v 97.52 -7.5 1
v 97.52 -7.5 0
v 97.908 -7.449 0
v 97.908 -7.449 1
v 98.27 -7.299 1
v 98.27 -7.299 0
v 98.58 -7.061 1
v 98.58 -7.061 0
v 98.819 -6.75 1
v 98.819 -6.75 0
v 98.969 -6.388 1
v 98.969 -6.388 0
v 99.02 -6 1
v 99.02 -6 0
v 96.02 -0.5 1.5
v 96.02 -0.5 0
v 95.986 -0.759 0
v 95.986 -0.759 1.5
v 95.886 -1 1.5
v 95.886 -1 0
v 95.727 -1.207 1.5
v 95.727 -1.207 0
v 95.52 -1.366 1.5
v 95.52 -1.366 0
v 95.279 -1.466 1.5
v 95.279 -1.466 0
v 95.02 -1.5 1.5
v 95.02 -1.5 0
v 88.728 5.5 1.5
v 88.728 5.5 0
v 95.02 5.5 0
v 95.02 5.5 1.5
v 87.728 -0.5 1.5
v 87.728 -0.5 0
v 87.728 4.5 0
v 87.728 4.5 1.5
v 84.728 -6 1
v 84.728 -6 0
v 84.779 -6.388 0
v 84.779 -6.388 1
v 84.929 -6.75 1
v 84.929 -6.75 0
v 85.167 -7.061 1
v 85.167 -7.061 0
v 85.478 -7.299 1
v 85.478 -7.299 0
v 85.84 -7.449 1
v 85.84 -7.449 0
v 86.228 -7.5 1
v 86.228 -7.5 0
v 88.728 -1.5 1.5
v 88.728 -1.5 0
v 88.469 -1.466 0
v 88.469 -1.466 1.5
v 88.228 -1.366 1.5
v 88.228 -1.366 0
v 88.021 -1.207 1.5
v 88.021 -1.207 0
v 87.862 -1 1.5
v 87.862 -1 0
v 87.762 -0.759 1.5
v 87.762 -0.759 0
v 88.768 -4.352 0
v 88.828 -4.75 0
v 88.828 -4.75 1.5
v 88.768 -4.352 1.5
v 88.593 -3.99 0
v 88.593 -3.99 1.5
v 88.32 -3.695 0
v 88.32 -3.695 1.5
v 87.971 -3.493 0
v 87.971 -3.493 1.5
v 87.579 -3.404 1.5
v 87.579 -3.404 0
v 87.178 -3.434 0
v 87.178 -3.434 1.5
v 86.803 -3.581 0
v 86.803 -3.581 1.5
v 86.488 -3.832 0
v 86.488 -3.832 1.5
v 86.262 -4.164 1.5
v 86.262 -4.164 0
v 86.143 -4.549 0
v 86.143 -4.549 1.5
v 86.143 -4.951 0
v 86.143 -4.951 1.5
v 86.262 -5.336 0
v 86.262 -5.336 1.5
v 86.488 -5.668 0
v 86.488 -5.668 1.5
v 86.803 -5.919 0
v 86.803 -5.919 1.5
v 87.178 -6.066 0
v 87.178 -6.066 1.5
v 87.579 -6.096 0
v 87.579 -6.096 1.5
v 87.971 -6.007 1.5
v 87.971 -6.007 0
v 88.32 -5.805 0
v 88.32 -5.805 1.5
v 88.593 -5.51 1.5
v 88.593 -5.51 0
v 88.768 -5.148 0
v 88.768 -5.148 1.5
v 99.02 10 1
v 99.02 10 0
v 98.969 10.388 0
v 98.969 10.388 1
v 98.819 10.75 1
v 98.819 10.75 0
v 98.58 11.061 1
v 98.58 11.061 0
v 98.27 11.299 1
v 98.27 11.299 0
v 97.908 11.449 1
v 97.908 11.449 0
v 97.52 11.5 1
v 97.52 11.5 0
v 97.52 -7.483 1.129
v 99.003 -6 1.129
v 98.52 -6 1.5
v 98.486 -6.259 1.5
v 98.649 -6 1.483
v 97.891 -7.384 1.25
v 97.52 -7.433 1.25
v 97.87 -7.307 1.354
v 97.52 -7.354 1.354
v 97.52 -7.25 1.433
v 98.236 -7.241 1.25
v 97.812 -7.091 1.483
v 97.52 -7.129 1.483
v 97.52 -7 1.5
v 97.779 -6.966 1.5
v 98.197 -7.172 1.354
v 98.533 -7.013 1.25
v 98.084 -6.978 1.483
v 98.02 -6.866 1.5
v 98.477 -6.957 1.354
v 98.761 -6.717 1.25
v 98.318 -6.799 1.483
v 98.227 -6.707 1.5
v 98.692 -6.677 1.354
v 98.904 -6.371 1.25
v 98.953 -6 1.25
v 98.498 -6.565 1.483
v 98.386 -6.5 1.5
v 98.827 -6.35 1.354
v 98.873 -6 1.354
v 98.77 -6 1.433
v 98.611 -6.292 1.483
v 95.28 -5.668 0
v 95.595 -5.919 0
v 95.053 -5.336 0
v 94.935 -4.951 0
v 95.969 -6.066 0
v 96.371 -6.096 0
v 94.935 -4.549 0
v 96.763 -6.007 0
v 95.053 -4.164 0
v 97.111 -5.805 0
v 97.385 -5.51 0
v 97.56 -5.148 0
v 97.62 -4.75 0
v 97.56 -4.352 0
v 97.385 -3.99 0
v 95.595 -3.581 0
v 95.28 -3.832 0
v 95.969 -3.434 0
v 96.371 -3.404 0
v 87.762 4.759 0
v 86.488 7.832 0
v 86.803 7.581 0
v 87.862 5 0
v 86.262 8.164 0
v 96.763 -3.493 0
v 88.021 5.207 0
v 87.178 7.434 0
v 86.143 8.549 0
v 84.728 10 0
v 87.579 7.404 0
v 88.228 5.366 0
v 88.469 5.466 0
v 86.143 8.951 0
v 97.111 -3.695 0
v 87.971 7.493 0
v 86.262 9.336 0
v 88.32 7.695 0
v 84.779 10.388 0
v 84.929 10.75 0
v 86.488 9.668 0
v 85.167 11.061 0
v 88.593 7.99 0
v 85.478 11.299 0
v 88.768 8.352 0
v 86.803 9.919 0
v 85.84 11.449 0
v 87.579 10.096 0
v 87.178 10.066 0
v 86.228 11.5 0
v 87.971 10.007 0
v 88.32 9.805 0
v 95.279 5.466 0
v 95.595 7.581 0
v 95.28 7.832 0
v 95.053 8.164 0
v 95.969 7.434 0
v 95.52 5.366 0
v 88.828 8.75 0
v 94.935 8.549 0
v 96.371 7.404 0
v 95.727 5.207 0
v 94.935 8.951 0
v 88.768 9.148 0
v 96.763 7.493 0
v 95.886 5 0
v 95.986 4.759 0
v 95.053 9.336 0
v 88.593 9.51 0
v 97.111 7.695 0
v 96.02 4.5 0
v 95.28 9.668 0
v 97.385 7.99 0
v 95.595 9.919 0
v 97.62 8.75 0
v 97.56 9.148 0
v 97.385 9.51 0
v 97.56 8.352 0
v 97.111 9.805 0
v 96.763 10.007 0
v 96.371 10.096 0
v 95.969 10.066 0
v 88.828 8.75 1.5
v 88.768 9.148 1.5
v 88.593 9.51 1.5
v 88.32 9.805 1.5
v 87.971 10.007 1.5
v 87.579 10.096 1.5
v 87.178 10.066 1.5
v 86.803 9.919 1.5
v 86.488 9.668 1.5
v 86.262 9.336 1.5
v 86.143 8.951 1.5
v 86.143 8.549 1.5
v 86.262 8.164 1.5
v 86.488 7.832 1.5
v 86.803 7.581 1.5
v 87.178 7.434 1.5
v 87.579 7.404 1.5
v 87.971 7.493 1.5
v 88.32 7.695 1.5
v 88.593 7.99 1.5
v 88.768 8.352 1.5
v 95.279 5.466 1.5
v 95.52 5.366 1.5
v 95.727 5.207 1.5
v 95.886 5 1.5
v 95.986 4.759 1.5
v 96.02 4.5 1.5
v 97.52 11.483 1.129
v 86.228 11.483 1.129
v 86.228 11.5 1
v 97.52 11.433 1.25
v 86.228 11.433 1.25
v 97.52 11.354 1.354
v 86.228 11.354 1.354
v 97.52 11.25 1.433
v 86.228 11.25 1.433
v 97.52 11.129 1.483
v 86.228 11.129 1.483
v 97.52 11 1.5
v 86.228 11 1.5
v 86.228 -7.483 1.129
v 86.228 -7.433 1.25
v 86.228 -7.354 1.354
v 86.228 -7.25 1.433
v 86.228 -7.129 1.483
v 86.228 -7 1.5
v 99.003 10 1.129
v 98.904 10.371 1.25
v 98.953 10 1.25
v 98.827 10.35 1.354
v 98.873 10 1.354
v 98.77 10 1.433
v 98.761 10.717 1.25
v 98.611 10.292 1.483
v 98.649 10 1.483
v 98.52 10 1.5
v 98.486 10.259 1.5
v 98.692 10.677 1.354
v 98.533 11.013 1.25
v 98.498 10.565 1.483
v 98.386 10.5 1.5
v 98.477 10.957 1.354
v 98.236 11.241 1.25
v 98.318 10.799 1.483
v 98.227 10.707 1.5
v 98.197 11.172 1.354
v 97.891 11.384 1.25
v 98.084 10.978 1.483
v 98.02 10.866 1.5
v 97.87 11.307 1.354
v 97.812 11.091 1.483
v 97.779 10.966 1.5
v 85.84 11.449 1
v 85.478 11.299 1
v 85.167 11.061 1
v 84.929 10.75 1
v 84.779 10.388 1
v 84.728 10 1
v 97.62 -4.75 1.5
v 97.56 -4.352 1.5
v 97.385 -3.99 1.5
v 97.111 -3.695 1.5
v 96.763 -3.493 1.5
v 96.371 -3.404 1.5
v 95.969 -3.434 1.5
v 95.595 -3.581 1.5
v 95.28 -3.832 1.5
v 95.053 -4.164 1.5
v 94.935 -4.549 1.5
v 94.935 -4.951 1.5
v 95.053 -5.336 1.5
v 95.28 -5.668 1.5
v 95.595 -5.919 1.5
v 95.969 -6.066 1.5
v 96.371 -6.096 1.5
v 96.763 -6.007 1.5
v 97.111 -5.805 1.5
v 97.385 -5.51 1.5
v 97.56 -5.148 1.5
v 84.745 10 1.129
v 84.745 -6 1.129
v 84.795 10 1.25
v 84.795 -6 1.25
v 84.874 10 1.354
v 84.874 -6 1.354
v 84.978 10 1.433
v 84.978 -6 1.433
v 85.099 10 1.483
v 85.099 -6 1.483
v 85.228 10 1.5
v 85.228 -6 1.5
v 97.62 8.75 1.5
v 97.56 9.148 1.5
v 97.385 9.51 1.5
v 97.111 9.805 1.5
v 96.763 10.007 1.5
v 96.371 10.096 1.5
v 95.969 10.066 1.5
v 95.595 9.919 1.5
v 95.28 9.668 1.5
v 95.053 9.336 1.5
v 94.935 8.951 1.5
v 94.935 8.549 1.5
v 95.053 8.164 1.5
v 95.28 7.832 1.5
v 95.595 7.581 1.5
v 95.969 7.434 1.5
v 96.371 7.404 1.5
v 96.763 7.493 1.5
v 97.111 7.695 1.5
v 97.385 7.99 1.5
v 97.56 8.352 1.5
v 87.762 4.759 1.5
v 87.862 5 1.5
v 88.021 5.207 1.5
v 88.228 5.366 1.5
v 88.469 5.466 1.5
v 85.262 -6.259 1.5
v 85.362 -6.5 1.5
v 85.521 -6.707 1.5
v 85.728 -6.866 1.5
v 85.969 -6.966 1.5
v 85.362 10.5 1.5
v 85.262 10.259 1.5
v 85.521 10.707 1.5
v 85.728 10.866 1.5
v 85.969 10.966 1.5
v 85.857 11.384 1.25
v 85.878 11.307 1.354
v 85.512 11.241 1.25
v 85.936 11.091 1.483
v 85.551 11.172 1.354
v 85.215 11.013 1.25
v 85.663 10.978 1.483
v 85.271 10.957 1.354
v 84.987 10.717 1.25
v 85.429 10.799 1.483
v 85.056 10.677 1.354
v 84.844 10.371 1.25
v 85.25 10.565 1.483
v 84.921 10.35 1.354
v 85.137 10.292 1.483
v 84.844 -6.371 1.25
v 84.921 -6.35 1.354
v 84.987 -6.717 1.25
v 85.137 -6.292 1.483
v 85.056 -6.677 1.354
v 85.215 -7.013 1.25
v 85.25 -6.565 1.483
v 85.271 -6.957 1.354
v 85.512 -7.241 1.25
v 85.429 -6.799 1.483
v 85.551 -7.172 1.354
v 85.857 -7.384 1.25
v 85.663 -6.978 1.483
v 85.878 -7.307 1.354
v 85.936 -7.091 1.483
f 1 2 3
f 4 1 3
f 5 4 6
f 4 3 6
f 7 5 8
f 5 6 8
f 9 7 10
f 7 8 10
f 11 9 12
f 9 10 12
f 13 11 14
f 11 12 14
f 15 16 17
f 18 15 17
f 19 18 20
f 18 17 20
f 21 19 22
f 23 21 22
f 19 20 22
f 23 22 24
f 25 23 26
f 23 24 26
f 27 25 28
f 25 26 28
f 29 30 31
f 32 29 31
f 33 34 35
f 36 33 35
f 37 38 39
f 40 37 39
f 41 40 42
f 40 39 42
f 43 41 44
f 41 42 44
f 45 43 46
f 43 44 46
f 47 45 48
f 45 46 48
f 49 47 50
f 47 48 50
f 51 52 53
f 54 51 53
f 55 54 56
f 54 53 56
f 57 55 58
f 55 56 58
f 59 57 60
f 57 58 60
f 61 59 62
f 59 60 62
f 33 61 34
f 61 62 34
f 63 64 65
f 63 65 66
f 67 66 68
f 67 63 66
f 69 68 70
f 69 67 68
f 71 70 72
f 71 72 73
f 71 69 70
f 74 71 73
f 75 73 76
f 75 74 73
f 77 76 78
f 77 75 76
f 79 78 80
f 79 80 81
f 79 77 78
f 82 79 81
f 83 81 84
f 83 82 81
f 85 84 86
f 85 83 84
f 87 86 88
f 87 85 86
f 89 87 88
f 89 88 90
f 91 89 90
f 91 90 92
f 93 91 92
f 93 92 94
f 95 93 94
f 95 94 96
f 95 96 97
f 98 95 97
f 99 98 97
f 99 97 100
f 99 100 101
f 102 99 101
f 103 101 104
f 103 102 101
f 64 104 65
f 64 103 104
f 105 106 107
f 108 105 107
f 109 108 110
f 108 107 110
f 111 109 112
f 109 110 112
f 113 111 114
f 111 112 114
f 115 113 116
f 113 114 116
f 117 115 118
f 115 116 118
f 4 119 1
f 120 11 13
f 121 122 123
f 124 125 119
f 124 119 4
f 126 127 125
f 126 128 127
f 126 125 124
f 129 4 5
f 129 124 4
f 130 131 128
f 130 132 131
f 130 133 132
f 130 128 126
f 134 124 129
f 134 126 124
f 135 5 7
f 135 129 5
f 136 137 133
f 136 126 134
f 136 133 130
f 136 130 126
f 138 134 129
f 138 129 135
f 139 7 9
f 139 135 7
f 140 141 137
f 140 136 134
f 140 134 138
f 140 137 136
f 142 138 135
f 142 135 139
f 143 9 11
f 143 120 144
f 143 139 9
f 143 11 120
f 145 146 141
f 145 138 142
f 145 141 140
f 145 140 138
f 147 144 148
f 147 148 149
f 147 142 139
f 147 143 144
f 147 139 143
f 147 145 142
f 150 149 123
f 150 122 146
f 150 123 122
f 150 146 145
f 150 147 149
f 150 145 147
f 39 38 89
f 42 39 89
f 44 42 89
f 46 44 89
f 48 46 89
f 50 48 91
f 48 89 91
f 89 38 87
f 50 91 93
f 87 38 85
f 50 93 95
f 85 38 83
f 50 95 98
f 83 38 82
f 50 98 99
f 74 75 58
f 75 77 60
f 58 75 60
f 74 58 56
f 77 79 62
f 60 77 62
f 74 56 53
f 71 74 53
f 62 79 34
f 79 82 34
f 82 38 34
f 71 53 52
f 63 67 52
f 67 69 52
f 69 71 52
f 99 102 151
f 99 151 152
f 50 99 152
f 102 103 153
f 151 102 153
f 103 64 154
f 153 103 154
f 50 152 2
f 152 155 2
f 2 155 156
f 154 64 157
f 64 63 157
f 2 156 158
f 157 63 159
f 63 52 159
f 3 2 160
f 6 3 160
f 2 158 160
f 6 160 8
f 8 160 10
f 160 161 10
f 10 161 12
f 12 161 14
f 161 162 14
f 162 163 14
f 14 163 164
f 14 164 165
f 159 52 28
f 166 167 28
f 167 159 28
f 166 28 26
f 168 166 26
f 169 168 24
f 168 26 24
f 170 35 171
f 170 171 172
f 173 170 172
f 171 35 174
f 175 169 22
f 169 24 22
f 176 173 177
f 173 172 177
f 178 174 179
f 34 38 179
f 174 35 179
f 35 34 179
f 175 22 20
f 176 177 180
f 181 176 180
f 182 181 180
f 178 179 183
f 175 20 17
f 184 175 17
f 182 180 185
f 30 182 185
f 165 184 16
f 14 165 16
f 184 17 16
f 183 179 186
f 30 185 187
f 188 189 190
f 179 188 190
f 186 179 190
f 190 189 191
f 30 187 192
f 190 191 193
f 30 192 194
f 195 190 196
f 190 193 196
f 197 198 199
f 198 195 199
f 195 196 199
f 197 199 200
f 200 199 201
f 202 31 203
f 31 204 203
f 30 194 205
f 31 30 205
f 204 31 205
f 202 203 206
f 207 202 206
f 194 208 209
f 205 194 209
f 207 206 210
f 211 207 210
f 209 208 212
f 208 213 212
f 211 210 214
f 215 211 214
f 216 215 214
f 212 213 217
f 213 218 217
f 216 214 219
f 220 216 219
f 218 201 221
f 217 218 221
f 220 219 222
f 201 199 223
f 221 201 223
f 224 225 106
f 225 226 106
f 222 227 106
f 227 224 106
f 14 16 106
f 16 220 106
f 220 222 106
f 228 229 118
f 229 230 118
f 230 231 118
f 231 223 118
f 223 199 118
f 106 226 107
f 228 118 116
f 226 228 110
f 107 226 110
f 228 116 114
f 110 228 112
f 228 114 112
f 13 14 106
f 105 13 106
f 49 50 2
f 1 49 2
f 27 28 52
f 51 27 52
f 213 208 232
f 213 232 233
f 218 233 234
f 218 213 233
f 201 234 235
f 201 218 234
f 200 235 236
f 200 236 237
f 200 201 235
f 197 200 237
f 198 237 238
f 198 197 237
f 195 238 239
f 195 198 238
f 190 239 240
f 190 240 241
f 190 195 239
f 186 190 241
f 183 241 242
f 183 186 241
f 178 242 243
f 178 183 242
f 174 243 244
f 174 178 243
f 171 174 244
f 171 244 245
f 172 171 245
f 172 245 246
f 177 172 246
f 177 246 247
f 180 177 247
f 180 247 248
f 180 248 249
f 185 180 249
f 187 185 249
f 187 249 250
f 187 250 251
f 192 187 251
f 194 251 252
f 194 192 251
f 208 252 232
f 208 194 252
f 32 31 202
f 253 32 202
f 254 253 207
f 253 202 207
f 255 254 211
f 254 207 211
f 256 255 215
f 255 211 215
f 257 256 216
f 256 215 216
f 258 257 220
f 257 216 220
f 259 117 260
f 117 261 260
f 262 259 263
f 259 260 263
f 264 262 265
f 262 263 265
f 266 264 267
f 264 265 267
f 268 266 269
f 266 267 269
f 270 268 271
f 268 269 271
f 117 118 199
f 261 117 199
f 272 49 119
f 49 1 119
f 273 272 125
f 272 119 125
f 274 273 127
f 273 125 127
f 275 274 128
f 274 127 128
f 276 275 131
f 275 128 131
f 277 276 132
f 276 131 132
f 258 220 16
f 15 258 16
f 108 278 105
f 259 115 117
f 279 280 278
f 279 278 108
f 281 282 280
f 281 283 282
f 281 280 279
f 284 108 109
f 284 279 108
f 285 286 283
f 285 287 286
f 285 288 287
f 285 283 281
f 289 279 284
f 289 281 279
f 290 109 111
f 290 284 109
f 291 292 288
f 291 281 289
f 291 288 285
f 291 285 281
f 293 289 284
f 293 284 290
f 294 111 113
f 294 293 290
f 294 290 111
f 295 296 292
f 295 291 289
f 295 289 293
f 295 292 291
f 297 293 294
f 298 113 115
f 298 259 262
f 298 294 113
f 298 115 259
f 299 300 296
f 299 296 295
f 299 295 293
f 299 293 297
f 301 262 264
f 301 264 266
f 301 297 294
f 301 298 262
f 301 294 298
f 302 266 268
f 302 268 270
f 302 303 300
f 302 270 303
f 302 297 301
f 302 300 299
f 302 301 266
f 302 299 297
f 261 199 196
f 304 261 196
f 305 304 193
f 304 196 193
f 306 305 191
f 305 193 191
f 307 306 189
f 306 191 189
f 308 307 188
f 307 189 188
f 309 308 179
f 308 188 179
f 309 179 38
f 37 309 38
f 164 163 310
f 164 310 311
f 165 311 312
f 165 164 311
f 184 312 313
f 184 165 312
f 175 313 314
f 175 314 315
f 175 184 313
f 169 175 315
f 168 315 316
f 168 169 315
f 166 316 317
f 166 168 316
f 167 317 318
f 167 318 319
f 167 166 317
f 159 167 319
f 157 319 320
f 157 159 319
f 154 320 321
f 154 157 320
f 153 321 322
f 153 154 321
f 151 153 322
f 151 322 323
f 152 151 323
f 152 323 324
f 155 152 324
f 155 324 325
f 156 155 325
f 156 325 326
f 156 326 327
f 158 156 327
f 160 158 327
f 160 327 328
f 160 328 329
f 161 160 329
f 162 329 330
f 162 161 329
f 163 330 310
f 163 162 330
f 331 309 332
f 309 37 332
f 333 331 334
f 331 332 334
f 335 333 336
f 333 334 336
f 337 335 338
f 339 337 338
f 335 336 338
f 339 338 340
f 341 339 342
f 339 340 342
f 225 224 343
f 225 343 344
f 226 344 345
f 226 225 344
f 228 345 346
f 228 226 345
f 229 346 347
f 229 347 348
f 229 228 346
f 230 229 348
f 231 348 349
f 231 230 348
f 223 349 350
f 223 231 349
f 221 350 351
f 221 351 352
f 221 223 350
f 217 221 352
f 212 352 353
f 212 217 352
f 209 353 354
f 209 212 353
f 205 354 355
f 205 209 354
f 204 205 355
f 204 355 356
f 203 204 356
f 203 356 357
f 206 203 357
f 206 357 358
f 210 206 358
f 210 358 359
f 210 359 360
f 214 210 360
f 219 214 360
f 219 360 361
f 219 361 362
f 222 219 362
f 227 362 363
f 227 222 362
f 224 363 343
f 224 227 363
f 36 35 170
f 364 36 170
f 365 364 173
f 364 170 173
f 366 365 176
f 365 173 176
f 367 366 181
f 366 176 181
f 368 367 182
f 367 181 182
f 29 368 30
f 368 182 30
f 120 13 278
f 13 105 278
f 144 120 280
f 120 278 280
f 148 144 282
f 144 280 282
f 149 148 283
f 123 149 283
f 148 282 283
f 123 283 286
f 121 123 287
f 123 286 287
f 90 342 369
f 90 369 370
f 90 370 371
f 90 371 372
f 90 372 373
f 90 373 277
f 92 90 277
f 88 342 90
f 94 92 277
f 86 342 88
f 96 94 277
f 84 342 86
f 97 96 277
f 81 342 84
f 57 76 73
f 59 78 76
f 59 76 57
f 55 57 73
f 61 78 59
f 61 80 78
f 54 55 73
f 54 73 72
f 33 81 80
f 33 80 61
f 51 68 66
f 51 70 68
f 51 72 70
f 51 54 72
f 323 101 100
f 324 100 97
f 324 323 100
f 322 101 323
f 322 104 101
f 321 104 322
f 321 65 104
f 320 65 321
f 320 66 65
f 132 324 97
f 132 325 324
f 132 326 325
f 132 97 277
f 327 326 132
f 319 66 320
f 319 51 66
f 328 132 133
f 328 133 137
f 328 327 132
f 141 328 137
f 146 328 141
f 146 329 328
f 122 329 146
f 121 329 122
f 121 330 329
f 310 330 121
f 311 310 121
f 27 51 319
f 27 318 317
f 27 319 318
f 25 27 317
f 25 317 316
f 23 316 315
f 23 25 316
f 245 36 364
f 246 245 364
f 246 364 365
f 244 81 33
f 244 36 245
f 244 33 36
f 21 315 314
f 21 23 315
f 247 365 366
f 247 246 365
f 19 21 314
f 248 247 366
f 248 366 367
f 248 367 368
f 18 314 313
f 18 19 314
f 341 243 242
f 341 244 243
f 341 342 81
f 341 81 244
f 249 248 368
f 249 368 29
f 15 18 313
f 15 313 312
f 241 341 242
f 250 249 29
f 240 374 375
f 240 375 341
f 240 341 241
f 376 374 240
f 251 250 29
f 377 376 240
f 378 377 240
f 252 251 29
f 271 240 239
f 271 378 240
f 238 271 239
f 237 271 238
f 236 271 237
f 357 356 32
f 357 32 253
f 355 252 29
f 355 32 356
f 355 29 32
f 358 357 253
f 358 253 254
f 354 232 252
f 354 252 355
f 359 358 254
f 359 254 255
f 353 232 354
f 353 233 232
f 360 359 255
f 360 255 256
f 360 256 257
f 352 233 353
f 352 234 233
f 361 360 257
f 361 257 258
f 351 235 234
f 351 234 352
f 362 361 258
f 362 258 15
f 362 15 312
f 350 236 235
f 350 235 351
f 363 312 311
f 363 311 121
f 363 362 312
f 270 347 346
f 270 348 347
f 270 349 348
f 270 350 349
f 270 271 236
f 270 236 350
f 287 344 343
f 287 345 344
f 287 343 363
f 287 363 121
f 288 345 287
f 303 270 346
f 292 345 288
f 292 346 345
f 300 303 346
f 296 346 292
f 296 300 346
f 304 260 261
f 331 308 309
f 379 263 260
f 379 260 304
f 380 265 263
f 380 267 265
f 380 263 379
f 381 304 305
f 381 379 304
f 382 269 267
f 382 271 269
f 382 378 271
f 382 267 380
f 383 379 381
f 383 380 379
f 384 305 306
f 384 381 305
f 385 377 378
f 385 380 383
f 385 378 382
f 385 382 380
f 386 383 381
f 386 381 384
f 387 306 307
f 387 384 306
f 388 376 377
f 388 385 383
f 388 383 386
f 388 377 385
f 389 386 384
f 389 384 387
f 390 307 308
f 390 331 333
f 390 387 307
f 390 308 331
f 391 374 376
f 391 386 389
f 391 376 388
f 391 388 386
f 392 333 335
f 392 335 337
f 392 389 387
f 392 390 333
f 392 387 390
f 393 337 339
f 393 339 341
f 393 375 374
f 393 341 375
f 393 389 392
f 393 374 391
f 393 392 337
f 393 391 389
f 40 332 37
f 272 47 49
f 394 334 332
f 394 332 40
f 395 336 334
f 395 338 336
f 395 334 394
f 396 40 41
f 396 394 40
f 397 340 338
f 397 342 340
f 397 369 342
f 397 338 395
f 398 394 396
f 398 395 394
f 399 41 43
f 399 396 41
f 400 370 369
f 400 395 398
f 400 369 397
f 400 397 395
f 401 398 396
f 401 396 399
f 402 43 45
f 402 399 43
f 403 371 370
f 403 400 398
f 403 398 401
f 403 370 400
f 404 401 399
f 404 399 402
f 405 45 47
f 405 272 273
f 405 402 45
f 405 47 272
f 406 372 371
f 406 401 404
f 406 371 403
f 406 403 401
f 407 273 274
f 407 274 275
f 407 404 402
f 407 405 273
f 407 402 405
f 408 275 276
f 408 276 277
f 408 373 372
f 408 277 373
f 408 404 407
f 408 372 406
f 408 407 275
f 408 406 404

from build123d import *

# Parameters (mm, degrees)
SKETCH_1_R      = 1.35
EXTRUDE_2_DEPTH = 1.5
FILLET_1_R      = 0.5


with BuildPart() as part:
    # 草图1 → 凸台-拉伸2 (new body)
    with BuildSketch(Plane.XY):
        with BuildLine():
            Line((97.519773553, 11.5), (86.228033822, 11.5))
            ThreePointArc((86.228033822, 11.5), (85.16737365, 11.060660172), (84.728033822, 10))
            Line((84.728033822, 10), (84.728033822, 7))
            Line((84.728033822, 7), (84.728033822, -3))
            Line((84.728033822, -3), (84.728033822, -6))
            ThreePointArc((84.728033822, -6), (85.16737365, -7.060660172), (86.228033822, -7.5))
            Line((86.228033822, -7.5), (97.519773553, -7.5))
            ThreePointArc((97.519773553, -7.5), (98.580433725, -7.060660172), (99.019773553, -6))
            Line((99.019773553, -6), (99.019773553, -3))
            Line((99.019773553, -3), (99.019773553, 7))
            Line((99.019773553, 7), (99.019773553, 10))
            ThreePointArc((99.019773553, 10), (98.580433725, 11.060660172), (97.519773553, 11.5))
        make_face()
        with Locations((87.478033822, -4.75)):
            Circle(SKETCH_1_R, mode=Mode.SUBTRACT)
        with Locations((96.269773553, -4.75)):
            Circle(SKETCH_1_R, mode=Mode.SUBTRACT)
        with Locations((96.269773553, 8.75)):
            Circle(SKETCH_1_R, mode=Mode.SUBTRACT)
        with Locations((87.478033822, 8.75)):
            Circle(SKETCH_1_R, mode=Mode.SUBTRACT)
        with BuildLine():
            Line((88.728033822, 5.5), (95.019773553, 5.5))
            ThreePointArc((95.019773553, 5.5), (95.726880334, 5.207106781), (96.019773553, 4.5))
            Line((96.019773553, 4.5), (96.019773553, -0.5))
            ThreePointArc((96.019773553, -0.5), (95.726880334, -1.207106781), (95.019773553, -1.5))
            Line((95.019773553, -1.5), (88.728033822, -1.5))
            ThreePointArc((88.728033822, -1.5), (88.020927041, -1.207106781), (87.728033822, -0.5))
            Line((87.728033822, -0.5), (87.728033822, 4.5))
            ThreePointArc((87.728033822, 4.5), (88.020927041, 5.207106781), (88.728033822, 5.5))
        make_face(mode=Mode.SUBTRACT)
    extrude(amount=EXTRUDE_2_DEPTH)

    # 圆角1
    fillet_1_edges = [part.edges().sort_by_distance(p)[0] for p in [
        (85.16737365, 11.060660172, 1.5),
        (84.728033822, 2, 1.5),
        (85.16737365, -7.060660172, 1.5),
        (91.873903688, -7.5, 1.5),
        (98.580433725, -7.060660172, 1.5),
        (99.019773553, 2, 1.5),
        (98.580433725, 11.060660172, 1.5),
        (91.873903688, 11.5, 1.5),
    ]]
    fillet(fillet_1_edges, radius=FILLET_1_R)


solid = part.part
